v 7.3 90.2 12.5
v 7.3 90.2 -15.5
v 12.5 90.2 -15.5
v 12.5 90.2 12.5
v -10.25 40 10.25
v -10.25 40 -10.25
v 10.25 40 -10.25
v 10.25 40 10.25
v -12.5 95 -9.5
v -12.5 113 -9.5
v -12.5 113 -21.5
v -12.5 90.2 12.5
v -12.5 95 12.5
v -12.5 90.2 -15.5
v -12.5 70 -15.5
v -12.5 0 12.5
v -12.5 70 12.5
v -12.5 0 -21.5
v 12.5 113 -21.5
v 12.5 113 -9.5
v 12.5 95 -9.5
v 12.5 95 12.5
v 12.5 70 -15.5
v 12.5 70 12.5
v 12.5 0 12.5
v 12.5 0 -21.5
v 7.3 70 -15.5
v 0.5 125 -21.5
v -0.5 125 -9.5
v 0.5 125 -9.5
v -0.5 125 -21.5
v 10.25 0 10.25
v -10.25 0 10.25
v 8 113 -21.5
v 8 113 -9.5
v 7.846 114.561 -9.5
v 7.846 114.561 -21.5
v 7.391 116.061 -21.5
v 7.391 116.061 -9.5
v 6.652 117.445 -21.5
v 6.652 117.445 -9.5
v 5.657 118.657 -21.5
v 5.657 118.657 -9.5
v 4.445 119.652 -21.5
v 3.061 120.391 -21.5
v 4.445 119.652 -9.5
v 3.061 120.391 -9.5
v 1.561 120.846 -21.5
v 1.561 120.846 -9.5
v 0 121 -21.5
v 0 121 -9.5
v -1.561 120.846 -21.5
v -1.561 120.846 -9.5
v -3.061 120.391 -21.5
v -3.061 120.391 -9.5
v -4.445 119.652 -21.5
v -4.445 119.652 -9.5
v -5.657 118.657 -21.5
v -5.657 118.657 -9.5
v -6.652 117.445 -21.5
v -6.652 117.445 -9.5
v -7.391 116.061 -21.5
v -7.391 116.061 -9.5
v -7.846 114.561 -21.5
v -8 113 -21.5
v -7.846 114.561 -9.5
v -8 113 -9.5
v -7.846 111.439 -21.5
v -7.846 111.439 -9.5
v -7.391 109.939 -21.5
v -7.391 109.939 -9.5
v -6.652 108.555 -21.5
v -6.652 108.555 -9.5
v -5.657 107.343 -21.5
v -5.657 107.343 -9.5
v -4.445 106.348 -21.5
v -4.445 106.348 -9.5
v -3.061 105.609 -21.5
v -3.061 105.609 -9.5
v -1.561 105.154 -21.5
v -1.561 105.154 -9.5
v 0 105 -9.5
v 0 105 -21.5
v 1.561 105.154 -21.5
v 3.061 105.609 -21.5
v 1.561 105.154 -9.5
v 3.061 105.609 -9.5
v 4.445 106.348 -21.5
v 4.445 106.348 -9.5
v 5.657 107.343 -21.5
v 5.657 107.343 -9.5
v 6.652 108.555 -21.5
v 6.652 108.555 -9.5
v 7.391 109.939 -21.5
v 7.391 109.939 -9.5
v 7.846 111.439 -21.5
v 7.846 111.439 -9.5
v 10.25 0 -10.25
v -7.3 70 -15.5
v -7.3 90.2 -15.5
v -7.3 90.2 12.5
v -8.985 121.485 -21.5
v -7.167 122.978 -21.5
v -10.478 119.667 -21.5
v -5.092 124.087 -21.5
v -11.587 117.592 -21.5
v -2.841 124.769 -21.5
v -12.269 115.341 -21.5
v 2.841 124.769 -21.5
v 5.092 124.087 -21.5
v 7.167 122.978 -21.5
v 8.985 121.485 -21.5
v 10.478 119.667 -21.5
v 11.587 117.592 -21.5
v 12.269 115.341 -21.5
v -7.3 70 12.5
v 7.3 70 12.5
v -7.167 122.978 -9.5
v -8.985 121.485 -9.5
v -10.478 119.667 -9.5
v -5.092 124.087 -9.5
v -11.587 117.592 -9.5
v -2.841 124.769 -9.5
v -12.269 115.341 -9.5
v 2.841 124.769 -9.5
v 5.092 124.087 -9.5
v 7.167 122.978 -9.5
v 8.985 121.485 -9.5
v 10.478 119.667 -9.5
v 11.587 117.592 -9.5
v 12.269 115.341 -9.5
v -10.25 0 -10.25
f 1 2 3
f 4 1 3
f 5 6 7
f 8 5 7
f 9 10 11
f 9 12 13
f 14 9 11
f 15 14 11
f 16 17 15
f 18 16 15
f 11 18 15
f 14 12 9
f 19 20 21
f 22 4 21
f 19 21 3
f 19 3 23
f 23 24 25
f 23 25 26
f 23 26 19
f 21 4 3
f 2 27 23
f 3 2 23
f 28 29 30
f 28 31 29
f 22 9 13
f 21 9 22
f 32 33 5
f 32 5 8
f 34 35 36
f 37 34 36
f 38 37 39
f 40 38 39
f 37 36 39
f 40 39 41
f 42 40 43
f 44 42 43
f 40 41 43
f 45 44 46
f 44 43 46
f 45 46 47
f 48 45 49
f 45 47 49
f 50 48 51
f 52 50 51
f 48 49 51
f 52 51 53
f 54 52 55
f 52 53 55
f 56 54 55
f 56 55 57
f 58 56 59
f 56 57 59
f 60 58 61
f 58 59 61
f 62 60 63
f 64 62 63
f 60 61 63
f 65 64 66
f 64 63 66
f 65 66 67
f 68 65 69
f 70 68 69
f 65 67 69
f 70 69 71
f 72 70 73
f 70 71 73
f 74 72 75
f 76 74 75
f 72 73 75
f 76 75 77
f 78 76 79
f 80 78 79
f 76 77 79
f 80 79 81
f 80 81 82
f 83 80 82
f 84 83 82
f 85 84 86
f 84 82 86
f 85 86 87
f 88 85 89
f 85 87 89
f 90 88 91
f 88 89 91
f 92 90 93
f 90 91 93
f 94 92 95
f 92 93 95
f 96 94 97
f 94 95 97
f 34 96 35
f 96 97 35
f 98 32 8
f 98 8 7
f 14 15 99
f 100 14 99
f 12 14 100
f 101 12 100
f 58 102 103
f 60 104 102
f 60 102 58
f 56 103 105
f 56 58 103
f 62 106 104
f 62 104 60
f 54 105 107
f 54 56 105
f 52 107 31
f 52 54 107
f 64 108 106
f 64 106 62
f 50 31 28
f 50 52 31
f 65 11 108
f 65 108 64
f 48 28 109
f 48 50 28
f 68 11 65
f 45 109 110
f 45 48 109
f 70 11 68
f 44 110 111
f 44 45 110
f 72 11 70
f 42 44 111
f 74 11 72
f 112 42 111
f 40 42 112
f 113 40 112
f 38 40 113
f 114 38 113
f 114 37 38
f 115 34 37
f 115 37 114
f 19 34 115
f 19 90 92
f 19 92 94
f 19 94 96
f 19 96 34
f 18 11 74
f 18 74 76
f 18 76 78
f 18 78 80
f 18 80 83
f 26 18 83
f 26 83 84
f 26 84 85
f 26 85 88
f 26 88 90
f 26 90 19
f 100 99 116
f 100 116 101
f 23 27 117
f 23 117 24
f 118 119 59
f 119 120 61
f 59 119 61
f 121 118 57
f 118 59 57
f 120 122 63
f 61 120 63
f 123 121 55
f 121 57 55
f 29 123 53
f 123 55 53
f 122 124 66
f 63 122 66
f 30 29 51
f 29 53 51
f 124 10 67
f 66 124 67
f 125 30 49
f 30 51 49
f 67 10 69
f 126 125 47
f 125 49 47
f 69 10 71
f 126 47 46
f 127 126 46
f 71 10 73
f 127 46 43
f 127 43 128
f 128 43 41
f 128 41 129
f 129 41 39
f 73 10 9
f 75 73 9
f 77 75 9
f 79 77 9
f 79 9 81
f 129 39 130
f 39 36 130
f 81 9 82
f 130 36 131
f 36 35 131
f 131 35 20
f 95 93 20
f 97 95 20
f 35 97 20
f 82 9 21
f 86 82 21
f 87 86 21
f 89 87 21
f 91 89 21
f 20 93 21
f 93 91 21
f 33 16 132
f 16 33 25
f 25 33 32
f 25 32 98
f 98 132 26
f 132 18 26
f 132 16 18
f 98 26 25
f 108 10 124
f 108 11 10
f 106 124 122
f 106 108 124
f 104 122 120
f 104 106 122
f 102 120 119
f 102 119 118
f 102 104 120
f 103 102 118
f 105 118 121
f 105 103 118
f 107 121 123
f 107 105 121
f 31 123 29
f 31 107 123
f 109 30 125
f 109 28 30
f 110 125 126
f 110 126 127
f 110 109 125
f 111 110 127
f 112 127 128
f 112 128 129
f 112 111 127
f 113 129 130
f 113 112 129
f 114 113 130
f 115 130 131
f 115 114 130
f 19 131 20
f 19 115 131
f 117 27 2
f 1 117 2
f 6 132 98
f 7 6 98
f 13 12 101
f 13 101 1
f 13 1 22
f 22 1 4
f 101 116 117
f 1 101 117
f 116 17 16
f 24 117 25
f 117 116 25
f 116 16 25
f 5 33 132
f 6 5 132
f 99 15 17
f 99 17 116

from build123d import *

# Parameters (mm, degrees)
SKETCH1_W           = 25
SKETCH1_H           = 34
SKETCH1_W_2         = 20.5
SKETCH1_H_2         = 20.5
BOSS_EXTRUDE1_DEPTH = 40
SKETCH2_W           = 25
SKETCH2_H           = 34
BOSS_EXTRUDE2_DEPTH = 55
SKETCH3_W           = 25
SKETCH3_H           = 12
BOSS_EXTRUDE3_DEPTH = 20
SKETCH4_W           = 25
SKETCH4_H           = 12
BOSS_EXTRUDE4_DEPTH = 10
SKETCH6_R           = 8
CUT_EXTRUDE1_DEPTH  = 12
FILLET1_R           = 12
SKETCH7_W           = 5.2
SKETCH7_H           = 20.2
CUT_EXTRUDE2_DEPTH  = 28


with BuildPart() as part:
    # Sketch1 → Boss-Extrude1 (new body)
    with BuildSketch(Plane(origin=(0, 0, 0), x_dir=(1, 0, 0), z_dir=(0, 1, 0))):
        with Locations((0, 4.5)):
            Rectangle(SKETCH1_W, SKETCH1_H)
        Rectangle(SKETCH1_W_2, SKETCH1_H_2, mode=Mode.SUBTRACT)
    extrude(amount=BOSS_EXTRUDE1_DEPTH)

    # Sketch2 → Boss-Extrude2 (add)
    with BuildSketch(Plane(origin=(0, 40, 0), x_dir=(1, 0, 0), z_dir=(0, 1, 0))):
        with Locations((0, 4.5)):
            Rectangle(SKETCH2_W, SKETCH2_H)
    extrude(amount=BOSS_EXTRUDE2_DEPTH)

    # Sketch3 → Boss-Extrude3 (add)
    with BuildSketch(Plane(origin=(0, 95, 0), x_dir=(1, 0, 0), z_dir=(0, 1, 0))):
        with Locations((0, 15.5)):
            Rectangle(SKETCH3_W, SKETCH3_H)
    extrude(amount=BOSS_EXTRUDE3_DEPTH)

    # Sketch4 → Boss-Extrude4 (add)
    with BuildSketch(Plane(origin=(0, 115, 0), x_dir=(1, 0, 0), z_dir=(0, 1, 0))):
        with Locations((0, 15.5)):
            Rectangle(SKETCH4_W, SKETCH4_H)
    extrude(amount=BOSS_EXTRUDE4_DEPTH)

    # Sketch6 → Cut-Extrude1 (cut)
    with BuildSketch(Plane.XY.offset(-9.5)):
        with Locations((0, 113)):
            Circle(SKETCH6_R)
    extrude(amount=-CUT_EXTRUDE1_DEPTH, mode=Mode.SUBTRACT)

    # Fillet1
    fillet1_edges = [part.edges().sort_by_distance(p)[0] for p in [
        (-12.5, 125, -15.5),
        (12.5, 125, -15.5),
    ]]
    fillet(fillet1_edges, radius=FILLET1_R)

    # Sketch7 → Cut-Extrude2 (cut)
    with BuildSketch(Plane.XY.offset(12.5)):
        with Locations((-9.9, 80.1)):
            Rectangle(SKETCH7_W, SKETCH7_H)
        with Locations((9.9, 80.1)):
            Rectangle(SKETCH7_W, SKETCH7_H)
    extrude(amount=-CUT_EXTRUDE2_DEPTH, mode=Mode.SUBTRACT)


solid = part.part
